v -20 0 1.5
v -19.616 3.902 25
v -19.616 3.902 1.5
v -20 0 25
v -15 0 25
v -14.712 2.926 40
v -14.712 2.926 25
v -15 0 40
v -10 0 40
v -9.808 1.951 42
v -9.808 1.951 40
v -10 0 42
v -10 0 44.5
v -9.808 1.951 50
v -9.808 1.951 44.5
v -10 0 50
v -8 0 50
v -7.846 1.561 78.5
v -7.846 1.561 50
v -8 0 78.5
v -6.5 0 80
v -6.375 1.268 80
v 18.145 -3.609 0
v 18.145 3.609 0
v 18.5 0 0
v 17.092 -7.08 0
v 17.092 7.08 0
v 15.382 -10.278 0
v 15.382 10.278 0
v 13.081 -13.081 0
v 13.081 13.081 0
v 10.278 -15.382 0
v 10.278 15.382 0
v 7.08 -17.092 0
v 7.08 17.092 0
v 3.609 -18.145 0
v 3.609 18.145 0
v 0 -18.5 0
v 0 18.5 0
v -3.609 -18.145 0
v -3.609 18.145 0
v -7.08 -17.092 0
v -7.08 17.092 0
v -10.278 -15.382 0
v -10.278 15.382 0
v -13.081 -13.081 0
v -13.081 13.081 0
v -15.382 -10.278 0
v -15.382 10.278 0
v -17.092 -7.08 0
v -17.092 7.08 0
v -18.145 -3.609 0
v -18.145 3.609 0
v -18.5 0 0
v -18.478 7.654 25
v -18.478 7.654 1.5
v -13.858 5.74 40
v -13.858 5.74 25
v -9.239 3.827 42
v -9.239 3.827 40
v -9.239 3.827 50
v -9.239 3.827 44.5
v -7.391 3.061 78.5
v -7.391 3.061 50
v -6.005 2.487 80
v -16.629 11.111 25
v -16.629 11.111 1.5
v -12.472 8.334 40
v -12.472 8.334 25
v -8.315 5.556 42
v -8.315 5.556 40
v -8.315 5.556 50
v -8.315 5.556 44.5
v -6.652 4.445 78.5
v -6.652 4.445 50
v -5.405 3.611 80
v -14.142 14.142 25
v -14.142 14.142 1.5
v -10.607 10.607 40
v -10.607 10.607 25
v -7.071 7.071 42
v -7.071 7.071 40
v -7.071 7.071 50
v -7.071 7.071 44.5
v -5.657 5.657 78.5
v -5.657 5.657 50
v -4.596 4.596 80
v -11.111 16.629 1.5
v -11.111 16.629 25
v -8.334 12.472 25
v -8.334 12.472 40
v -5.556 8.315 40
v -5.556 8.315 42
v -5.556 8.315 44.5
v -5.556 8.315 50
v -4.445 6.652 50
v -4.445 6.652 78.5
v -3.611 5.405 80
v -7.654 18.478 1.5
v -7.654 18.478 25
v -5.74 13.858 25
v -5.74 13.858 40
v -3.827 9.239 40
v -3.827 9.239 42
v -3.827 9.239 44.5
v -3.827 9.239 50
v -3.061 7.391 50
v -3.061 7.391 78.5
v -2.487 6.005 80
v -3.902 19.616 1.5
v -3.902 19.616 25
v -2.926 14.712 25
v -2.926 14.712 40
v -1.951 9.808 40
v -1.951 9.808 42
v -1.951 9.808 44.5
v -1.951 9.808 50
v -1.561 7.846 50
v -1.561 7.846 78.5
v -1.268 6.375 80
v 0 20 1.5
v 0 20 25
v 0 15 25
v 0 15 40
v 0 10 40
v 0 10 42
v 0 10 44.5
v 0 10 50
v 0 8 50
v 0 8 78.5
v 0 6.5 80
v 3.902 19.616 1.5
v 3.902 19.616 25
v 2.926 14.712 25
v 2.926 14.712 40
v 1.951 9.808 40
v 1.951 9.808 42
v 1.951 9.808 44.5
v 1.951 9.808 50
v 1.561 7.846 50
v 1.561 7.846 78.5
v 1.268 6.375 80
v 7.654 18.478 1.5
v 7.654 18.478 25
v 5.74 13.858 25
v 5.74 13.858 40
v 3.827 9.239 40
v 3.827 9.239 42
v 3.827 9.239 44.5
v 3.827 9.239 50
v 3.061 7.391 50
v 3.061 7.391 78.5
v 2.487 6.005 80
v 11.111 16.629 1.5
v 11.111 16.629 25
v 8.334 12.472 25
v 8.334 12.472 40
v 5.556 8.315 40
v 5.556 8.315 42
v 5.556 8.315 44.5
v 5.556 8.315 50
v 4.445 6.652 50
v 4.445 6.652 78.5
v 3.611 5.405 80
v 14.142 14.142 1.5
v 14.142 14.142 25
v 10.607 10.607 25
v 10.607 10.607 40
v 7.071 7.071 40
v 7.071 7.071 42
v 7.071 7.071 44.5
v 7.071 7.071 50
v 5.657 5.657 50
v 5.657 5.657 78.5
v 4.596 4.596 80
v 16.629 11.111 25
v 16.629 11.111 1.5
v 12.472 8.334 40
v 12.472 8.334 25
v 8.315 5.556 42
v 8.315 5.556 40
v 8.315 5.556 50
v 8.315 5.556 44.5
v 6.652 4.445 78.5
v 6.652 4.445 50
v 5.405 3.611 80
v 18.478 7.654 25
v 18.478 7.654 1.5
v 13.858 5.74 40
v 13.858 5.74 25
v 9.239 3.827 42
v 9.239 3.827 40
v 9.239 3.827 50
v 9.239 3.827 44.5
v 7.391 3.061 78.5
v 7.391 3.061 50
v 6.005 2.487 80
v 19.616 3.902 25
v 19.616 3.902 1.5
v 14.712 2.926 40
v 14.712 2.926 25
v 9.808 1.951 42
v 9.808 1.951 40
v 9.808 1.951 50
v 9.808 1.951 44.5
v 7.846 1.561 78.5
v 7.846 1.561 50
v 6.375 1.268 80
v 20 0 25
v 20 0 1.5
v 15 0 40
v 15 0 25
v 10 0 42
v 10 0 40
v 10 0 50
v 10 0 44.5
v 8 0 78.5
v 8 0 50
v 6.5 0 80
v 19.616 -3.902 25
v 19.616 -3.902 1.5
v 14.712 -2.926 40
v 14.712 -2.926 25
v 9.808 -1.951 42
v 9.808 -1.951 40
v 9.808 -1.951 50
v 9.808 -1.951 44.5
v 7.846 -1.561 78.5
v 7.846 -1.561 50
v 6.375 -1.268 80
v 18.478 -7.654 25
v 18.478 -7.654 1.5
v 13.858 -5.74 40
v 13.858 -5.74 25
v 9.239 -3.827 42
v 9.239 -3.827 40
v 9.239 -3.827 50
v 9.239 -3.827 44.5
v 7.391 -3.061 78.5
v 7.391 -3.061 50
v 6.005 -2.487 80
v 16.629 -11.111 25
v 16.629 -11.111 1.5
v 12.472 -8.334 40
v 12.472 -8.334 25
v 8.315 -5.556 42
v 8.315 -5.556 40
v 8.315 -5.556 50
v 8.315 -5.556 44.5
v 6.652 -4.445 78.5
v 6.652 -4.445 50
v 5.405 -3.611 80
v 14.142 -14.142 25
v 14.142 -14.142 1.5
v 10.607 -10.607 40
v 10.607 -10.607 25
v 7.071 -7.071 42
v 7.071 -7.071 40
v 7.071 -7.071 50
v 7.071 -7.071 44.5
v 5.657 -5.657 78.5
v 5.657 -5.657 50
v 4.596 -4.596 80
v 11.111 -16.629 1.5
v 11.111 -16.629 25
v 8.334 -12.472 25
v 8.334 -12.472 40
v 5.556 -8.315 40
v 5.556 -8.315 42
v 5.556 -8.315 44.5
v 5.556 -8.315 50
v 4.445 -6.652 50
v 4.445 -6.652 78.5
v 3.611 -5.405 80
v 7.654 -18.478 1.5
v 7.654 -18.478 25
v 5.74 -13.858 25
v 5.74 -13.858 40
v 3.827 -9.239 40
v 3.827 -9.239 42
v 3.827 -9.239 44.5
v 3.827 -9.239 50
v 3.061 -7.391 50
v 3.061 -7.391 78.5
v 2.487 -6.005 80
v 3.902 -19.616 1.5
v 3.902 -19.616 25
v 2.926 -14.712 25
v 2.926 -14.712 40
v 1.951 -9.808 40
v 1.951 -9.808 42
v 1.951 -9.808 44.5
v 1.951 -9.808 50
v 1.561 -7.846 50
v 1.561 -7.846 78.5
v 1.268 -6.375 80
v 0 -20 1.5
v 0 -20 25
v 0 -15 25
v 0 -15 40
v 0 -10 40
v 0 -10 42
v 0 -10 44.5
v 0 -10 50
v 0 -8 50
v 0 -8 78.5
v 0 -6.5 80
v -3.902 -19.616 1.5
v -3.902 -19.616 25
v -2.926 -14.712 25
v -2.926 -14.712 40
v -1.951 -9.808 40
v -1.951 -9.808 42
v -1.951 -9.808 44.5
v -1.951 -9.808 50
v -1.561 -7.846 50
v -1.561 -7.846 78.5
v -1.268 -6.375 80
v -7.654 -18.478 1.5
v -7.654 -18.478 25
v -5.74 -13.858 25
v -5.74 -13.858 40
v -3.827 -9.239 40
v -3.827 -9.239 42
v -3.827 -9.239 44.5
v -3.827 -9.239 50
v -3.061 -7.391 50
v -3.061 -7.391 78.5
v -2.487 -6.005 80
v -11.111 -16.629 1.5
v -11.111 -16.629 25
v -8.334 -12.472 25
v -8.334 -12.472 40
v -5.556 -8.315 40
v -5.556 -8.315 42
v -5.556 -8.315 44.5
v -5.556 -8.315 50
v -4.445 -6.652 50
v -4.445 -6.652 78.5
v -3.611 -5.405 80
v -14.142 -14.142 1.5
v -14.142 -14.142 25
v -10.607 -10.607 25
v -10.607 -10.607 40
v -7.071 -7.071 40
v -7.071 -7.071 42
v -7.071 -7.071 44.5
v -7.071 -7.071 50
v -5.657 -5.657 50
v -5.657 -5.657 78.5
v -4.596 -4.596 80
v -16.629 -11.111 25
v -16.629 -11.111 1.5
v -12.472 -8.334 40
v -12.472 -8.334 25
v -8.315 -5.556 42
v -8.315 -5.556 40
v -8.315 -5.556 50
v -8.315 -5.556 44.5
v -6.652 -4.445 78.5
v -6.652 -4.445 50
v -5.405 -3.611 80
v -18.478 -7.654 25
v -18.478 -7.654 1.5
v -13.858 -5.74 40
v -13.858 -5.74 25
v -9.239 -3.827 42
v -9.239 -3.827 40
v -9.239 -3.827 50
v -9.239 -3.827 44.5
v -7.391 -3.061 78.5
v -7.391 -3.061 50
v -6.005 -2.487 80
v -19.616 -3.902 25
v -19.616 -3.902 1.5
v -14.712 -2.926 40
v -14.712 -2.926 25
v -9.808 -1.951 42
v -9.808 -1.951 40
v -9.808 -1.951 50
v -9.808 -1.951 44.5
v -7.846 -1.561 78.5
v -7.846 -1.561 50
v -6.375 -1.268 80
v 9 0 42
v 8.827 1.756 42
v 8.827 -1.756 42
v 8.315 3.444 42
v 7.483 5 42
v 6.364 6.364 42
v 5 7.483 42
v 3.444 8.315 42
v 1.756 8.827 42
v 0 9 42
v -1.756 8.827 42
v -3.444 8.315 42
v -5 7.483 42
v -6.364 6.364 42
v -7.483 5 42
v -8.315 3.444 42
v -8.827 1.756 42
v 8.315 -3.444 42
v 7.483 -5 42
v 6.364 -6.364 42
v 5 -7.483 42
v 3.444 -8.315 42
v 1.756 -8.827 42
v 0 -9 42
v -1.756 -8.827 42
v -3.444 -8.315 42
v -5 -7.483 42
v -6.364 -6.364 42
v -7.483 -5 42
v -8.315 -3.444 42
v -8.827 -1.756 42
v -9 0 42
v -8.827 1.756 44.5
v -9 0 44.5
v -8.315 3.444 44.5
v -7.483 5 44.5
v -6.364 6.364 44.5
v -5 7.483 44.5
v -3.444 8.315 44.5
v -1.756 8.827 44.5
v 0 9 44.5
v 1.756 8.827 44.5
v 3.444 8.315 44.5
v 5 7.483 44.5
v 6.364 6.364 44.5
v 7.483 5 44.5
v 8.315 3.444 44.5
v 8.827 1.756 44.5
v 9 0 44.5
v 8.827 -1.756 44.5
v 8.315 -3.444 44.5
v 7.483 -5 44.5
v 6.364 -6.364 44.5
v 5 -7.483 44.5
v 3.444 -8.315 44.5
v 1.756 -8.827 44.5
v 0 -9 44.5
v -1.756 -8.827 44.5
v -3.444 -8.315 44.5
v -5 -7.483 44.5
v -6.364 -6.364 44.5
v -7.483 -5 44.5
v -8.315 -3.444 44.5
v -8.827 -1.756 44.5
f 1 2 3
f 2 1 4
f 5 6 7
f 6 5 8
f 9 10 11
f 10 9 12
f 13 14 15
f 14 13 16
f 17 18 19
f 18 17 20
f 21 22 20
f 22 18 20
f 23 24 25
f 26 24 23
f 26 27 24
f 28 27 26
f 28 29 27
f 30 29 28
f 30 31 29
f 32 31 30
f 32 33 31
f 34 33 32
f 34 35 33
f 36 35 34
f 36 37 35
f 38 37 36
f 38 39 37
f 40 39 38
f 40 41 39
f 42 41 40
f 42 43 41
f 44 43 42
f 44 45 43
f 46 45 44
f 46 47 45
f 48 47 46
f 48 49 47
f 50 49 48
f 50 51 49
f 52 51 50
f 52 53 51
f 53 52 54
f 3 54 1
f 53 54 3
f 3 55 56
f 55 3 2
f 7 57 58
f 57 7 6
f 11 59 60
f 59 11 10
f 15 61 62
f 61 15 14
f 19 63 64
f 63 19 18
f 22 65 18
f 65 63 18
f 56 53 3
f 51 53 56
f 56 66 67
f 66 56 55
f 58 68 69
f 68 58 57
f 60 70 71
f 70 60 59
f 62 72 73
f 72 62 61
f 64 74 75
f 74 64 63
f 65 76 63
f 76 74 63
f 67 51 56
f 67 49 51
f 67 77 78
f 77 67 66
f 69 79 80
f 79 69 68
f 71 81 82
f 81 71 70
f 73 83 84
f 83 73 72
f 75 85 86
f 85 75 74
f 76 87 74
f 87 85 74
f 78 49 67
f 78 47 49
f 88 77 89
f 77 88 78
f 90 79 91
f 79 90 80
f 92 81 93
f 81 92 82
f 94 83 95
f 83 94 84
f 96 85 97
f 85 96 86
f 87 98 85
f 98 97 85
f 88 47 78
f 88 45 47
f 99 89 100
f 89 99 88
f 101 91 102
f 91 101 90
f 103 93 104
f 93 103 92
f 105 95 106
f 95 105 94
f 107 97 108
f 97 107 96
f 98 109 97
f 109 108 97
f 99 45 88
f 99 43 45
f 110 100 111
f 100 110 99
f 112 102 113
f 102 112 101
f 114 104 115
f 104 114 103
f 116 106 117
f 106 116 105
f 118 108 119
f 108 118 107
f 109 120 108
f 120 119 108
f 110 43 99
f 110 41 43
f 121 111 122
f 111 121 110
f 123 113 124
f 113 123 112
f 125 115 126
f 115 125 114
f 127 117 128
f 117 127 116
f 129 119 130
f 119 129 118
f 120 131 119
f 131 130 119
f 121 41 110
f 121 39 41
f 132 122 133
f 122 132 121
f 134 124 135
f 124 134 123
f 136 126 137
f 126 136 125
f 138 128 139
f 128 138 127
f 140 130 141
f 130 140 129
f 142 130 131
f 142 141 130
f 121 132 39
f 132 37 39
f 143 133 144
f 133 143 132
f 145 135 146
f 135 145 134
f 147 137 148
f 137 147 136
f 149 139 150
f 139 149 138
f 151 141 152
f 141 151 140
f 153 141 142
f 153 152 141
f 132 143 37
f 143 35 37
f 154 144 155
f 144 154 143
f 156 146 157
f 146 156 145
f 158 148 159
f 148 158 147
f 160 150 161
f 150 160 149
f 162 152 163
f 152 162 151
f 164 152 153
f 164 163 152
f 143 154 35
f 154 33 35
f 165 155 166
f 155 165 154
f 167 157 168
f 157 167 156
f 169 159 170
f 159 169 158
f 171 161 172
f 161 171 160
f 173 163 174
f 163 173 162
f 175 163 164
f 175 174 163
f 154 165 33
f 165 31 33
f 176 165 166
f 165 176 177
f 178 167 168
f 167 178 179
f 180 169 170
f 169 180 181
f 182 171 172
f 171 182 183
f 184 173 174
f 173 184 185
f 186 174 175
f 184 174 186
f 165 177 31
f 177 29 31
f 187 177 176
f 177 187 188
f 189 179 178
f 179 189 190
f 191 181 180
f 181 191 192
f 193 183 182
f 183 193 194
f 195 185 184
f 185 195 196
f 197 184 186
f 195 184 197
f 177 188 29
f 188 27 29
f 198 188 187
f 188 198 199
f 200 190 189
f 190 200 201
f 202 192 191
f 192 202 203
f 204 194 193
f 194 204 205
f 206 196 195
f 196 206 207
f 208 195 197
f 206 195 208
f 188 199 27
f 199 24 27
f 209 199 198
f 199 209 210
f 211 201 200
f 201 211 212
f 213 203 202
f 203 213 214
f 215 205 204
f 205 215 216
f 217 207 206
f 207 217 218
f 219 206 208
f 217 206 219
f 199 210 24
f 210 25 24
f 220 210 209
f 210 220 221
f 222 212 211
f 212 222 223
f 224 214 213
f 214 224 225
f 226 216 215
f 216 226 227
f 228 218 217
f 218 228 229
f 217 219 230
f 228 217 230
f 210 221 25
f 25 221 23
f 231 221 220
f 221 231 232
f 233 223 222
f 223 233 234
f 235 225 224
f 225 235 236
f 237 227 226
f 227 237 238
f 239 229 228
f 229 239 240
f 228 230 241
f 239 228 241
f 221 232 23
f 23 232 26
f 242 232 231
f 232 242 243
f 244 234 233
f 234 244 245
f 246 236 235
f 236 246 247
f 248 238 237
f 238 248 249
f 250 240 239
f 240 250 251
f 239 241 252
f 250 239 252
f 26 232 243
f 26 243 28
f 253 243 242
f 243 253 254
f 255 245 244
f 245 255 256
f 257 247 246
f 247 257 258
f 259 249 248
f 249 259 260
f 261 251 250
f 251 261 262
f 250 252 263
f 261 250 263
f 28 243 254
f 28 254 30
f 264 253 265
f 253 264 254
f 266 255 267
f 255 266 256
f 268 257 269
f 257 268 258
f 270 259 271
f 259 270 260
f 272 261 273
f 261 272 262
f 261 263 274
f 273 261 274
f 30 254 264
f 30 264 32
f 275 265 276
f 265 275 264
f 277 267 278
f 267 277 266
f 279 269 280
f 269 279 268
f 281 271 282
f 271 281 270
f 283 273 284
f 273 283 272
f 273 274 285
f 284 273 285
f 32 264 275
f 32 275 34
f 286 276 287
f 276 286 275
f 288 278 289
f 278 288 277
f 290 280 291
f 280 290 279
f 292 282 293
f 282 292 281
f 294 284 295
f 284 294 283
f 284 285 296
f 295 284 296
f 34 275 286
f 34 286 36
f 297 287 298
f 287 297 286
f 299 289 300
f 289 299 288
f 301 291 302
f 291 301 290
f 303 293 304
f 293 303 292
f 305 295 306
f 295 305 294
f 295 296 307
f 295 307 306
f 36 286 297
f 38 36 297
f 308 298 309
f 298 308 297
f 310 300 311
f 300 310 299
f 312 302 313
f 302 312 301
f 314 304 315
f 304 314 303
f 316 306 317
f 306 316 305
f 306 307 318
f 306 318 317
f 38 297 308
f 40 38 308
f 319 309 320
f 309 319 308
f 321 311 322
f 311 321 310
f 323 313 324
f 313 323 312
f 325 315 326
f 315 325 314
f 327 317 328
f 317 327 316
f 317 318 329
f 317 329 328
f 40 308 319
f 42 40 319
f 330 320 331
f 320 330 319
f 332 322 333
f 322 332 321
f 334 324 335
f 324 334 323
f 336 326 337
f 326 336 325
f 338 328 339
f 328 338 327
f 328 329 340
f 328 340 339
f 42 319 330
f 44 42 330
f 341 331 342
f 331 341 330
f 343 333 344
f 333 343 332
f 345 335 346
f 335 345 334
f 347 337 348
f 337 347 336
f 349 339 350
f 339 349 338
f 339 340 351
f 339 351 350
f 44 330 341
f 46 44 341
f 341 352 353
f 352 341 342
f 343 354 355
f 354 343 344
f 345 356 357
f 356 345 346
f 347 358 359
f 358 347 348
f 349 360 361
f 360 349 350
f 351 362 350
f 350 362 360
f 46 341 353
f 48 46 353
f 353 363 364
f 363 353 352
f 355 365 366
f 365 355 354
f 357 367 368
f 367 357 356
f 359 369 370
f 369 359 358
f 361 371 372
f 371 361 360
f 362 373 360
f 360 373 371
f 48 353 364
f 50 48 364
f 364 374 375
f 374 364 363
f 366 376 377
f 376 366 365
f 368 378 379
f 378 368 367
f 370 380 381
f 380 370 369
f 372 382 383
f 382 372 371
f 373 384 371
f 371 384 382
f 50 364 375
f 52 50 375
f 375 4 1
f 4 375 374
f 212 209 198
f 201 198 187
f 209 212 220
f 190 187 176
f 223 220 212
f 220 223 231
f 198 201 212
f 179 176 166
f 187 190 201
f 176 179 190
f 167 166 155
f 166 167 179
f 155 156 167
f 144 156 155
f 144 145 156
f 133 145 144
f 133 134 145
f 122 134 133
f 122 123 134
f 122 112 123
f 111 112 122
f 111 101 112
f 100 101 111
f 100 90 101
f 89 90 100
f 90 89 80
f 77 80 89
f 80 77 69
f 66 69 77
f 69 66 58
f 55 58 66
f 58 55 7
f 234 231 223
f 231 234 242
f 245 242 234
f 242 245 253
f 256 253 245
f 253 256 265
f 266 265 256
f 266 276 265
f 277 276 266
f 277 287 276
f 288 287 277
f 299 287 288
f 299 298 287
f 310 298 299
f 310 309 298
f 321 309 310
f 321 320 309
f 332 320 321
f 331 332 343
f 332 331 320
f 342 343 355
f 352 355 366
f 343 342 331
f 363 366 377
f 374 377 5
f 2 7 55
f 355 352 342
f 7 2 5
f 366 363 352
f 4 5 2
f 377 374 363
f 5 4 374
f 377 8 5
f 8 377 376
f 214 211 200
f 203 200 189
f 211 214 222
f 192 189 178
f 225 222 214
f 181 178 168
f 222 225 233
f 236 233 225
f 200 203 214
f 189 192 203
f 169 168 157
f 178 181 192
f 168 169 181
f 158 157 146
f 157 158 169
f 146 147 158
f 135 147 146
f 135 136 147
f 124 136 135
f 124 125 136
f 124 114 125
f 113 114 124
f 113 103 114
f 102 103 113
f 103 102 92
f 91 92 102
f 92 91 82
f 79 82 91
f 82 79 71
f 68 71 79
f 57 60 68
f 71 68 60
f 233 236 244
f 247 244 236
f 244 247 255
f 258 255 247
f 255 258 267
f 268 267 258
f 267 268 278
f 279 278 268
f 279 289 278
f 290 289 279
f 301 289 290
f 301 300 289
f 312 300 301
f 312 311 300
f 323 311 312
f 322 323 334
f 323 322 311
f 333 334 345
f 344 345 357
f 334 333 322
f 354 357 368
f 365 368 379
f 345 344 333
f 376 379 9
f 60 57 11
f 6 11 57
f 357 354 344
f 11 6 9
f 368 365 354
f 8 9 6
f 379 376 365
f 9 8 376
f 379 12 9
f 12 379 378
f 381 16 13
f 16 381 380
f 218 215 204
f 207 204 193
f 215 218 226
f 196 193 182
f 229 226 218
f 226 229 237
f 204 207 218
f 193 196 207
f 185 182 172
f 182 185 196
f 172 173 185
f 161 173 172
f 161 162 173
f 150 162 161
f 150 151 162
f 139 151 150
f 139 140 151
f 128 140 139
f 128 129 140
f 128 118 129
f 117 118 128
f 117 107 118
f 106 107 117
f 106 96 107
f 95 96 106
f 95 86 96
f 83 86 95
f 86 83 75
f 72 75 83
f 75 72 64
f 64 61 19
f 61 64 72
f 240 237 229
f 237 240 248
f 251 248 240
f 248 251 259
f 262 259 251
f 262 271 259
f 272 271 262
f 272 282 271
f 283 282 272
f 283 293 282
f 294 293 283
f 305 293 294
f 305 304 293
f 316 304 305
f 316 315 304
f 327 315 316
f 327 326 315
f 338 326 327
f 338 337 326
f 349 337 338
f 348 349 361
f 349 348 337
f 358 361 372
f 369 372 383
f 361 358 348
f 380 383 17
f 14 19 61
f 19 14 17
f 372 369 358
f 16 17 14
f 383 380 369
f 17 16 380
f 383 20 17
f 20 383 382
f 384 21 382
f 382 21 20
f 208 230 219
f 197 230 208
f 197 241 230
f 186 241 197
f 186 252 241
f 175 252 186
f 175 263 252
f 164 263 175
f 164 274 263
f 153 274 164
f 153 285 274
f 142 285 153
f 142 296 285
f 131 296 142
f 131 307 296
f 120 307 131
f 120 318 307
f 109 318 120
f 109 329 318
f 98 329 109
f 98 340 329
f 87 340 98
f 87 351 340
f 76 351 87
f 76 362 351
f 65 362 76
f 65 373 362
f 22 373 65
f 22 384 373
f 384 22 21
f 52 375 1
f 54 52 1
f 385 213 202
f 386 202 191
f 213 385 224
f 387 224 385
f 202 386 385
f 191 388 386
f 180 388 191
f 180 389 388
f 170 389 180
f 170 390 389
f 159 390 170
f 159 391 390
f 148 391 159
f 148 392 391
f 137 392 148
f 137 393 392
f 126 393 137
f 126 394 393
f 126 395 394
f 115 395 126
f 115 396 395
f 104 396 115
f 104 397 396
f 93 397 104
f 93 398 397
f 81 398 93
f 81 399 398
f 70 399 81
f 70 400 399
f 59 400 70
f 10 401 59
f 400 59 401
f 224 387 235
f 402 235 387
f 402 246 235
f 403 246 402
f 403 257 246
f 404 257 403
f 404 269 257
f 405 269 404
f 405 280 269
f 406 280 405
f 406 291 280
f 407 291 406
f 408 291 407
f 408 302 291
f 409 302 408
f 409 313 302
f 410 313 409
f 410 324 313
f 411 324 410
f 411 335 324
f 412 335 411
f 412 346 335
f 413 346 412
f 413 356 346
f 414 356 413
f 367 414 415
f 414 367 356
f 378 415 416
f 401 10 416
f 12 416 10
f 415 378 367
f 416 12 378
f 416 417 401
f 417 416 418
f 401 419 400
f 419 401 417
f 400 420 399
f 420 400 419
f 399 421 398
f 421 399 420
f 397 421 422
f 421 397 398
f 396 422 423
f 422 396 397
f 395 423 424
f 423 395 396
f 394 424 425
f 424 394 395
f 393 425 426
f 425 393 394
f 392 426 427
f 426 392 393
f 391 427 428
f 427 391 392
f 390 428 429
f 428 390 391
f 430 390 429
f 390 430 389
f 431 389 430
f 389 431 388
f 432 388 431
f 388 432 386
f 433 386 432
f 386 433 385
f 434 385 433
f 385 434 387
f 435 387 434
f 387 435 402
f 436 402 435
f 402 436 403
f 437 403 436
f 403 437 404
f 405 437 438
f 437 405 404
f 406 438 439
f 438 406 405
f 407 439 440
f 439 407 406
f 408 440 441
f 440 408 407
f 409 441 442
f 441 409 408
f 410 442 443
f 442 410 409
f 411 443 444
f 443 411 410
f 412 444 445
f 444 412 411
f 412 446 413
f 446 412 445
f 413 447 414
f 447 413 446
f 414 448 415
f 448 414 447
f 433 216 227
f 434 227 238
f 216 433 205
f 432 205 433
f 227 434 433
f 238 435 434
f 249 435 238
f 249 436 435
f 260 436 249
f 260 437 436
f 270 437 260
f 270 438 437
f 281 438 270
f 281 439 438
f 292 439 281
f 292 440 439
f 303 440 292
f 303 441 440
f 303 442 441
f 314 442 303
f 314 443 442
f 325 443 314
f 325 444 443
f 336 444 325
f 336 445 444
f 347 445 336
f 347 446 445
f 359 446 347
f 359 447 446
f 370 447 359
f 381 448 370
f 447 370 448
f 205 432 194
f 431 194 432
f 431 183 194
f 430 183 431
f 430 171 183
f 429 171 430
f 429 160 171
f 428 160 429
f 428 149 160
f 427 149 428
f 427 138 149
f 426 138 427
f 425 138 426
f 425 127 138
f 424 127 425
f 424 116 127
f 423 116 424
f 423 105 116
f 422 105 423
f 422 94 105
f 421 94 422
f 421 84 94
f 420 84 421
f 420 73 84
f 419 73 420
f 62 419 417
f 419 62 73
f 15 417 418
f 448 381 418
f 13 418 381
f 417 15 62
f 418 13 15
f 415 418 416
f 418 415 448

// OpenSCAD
$fn = 32;

// ----------------------------------------------------------------------
// Stepped shaft: diameters 40, 30, 20, 16 mm, 80 mm long
// ----------------------------------------------------------------------

// --- parameters (mm) ---
d1 = 40;                  // step 1 diameter
len1 = 25;                // step 1 length
d2 = 30;                  // step 2 diameter
len2 = 15;                // step 2 length
d3 = 20;                  // step 3 diameter
len3 = 10;                // step 3 length
d4 = 16;                  // step 4 diameter
len4 = 30;                // step 4 length
total = 80;               // overall length
chamfer = 1.5;            // end chamfer
groove_r = 10;            // groove radius
groove_z = 42;            // groove position from the end
groove_w = 2.5;           // groove width
groove_d = 1;             // groove depth

/* closed turning profile: x is the radius, y is the length */
profile = [[0, 0], [20 - chamfer, 0], [20, chamfer], [20, 25], [15, 25], [15, 40], [10, 40], [10, 50], [8, 50], [8, 78.5], [6.5, 80], [0, 80]];

difference() {
  rotate_extrude() polygon(profile);
  /* circlip groove just behind the shoulder */
  rotate_extrude() translate([groove_r - groove_d, groove_z]) square([groove_d + 1, groove_w]);
}
